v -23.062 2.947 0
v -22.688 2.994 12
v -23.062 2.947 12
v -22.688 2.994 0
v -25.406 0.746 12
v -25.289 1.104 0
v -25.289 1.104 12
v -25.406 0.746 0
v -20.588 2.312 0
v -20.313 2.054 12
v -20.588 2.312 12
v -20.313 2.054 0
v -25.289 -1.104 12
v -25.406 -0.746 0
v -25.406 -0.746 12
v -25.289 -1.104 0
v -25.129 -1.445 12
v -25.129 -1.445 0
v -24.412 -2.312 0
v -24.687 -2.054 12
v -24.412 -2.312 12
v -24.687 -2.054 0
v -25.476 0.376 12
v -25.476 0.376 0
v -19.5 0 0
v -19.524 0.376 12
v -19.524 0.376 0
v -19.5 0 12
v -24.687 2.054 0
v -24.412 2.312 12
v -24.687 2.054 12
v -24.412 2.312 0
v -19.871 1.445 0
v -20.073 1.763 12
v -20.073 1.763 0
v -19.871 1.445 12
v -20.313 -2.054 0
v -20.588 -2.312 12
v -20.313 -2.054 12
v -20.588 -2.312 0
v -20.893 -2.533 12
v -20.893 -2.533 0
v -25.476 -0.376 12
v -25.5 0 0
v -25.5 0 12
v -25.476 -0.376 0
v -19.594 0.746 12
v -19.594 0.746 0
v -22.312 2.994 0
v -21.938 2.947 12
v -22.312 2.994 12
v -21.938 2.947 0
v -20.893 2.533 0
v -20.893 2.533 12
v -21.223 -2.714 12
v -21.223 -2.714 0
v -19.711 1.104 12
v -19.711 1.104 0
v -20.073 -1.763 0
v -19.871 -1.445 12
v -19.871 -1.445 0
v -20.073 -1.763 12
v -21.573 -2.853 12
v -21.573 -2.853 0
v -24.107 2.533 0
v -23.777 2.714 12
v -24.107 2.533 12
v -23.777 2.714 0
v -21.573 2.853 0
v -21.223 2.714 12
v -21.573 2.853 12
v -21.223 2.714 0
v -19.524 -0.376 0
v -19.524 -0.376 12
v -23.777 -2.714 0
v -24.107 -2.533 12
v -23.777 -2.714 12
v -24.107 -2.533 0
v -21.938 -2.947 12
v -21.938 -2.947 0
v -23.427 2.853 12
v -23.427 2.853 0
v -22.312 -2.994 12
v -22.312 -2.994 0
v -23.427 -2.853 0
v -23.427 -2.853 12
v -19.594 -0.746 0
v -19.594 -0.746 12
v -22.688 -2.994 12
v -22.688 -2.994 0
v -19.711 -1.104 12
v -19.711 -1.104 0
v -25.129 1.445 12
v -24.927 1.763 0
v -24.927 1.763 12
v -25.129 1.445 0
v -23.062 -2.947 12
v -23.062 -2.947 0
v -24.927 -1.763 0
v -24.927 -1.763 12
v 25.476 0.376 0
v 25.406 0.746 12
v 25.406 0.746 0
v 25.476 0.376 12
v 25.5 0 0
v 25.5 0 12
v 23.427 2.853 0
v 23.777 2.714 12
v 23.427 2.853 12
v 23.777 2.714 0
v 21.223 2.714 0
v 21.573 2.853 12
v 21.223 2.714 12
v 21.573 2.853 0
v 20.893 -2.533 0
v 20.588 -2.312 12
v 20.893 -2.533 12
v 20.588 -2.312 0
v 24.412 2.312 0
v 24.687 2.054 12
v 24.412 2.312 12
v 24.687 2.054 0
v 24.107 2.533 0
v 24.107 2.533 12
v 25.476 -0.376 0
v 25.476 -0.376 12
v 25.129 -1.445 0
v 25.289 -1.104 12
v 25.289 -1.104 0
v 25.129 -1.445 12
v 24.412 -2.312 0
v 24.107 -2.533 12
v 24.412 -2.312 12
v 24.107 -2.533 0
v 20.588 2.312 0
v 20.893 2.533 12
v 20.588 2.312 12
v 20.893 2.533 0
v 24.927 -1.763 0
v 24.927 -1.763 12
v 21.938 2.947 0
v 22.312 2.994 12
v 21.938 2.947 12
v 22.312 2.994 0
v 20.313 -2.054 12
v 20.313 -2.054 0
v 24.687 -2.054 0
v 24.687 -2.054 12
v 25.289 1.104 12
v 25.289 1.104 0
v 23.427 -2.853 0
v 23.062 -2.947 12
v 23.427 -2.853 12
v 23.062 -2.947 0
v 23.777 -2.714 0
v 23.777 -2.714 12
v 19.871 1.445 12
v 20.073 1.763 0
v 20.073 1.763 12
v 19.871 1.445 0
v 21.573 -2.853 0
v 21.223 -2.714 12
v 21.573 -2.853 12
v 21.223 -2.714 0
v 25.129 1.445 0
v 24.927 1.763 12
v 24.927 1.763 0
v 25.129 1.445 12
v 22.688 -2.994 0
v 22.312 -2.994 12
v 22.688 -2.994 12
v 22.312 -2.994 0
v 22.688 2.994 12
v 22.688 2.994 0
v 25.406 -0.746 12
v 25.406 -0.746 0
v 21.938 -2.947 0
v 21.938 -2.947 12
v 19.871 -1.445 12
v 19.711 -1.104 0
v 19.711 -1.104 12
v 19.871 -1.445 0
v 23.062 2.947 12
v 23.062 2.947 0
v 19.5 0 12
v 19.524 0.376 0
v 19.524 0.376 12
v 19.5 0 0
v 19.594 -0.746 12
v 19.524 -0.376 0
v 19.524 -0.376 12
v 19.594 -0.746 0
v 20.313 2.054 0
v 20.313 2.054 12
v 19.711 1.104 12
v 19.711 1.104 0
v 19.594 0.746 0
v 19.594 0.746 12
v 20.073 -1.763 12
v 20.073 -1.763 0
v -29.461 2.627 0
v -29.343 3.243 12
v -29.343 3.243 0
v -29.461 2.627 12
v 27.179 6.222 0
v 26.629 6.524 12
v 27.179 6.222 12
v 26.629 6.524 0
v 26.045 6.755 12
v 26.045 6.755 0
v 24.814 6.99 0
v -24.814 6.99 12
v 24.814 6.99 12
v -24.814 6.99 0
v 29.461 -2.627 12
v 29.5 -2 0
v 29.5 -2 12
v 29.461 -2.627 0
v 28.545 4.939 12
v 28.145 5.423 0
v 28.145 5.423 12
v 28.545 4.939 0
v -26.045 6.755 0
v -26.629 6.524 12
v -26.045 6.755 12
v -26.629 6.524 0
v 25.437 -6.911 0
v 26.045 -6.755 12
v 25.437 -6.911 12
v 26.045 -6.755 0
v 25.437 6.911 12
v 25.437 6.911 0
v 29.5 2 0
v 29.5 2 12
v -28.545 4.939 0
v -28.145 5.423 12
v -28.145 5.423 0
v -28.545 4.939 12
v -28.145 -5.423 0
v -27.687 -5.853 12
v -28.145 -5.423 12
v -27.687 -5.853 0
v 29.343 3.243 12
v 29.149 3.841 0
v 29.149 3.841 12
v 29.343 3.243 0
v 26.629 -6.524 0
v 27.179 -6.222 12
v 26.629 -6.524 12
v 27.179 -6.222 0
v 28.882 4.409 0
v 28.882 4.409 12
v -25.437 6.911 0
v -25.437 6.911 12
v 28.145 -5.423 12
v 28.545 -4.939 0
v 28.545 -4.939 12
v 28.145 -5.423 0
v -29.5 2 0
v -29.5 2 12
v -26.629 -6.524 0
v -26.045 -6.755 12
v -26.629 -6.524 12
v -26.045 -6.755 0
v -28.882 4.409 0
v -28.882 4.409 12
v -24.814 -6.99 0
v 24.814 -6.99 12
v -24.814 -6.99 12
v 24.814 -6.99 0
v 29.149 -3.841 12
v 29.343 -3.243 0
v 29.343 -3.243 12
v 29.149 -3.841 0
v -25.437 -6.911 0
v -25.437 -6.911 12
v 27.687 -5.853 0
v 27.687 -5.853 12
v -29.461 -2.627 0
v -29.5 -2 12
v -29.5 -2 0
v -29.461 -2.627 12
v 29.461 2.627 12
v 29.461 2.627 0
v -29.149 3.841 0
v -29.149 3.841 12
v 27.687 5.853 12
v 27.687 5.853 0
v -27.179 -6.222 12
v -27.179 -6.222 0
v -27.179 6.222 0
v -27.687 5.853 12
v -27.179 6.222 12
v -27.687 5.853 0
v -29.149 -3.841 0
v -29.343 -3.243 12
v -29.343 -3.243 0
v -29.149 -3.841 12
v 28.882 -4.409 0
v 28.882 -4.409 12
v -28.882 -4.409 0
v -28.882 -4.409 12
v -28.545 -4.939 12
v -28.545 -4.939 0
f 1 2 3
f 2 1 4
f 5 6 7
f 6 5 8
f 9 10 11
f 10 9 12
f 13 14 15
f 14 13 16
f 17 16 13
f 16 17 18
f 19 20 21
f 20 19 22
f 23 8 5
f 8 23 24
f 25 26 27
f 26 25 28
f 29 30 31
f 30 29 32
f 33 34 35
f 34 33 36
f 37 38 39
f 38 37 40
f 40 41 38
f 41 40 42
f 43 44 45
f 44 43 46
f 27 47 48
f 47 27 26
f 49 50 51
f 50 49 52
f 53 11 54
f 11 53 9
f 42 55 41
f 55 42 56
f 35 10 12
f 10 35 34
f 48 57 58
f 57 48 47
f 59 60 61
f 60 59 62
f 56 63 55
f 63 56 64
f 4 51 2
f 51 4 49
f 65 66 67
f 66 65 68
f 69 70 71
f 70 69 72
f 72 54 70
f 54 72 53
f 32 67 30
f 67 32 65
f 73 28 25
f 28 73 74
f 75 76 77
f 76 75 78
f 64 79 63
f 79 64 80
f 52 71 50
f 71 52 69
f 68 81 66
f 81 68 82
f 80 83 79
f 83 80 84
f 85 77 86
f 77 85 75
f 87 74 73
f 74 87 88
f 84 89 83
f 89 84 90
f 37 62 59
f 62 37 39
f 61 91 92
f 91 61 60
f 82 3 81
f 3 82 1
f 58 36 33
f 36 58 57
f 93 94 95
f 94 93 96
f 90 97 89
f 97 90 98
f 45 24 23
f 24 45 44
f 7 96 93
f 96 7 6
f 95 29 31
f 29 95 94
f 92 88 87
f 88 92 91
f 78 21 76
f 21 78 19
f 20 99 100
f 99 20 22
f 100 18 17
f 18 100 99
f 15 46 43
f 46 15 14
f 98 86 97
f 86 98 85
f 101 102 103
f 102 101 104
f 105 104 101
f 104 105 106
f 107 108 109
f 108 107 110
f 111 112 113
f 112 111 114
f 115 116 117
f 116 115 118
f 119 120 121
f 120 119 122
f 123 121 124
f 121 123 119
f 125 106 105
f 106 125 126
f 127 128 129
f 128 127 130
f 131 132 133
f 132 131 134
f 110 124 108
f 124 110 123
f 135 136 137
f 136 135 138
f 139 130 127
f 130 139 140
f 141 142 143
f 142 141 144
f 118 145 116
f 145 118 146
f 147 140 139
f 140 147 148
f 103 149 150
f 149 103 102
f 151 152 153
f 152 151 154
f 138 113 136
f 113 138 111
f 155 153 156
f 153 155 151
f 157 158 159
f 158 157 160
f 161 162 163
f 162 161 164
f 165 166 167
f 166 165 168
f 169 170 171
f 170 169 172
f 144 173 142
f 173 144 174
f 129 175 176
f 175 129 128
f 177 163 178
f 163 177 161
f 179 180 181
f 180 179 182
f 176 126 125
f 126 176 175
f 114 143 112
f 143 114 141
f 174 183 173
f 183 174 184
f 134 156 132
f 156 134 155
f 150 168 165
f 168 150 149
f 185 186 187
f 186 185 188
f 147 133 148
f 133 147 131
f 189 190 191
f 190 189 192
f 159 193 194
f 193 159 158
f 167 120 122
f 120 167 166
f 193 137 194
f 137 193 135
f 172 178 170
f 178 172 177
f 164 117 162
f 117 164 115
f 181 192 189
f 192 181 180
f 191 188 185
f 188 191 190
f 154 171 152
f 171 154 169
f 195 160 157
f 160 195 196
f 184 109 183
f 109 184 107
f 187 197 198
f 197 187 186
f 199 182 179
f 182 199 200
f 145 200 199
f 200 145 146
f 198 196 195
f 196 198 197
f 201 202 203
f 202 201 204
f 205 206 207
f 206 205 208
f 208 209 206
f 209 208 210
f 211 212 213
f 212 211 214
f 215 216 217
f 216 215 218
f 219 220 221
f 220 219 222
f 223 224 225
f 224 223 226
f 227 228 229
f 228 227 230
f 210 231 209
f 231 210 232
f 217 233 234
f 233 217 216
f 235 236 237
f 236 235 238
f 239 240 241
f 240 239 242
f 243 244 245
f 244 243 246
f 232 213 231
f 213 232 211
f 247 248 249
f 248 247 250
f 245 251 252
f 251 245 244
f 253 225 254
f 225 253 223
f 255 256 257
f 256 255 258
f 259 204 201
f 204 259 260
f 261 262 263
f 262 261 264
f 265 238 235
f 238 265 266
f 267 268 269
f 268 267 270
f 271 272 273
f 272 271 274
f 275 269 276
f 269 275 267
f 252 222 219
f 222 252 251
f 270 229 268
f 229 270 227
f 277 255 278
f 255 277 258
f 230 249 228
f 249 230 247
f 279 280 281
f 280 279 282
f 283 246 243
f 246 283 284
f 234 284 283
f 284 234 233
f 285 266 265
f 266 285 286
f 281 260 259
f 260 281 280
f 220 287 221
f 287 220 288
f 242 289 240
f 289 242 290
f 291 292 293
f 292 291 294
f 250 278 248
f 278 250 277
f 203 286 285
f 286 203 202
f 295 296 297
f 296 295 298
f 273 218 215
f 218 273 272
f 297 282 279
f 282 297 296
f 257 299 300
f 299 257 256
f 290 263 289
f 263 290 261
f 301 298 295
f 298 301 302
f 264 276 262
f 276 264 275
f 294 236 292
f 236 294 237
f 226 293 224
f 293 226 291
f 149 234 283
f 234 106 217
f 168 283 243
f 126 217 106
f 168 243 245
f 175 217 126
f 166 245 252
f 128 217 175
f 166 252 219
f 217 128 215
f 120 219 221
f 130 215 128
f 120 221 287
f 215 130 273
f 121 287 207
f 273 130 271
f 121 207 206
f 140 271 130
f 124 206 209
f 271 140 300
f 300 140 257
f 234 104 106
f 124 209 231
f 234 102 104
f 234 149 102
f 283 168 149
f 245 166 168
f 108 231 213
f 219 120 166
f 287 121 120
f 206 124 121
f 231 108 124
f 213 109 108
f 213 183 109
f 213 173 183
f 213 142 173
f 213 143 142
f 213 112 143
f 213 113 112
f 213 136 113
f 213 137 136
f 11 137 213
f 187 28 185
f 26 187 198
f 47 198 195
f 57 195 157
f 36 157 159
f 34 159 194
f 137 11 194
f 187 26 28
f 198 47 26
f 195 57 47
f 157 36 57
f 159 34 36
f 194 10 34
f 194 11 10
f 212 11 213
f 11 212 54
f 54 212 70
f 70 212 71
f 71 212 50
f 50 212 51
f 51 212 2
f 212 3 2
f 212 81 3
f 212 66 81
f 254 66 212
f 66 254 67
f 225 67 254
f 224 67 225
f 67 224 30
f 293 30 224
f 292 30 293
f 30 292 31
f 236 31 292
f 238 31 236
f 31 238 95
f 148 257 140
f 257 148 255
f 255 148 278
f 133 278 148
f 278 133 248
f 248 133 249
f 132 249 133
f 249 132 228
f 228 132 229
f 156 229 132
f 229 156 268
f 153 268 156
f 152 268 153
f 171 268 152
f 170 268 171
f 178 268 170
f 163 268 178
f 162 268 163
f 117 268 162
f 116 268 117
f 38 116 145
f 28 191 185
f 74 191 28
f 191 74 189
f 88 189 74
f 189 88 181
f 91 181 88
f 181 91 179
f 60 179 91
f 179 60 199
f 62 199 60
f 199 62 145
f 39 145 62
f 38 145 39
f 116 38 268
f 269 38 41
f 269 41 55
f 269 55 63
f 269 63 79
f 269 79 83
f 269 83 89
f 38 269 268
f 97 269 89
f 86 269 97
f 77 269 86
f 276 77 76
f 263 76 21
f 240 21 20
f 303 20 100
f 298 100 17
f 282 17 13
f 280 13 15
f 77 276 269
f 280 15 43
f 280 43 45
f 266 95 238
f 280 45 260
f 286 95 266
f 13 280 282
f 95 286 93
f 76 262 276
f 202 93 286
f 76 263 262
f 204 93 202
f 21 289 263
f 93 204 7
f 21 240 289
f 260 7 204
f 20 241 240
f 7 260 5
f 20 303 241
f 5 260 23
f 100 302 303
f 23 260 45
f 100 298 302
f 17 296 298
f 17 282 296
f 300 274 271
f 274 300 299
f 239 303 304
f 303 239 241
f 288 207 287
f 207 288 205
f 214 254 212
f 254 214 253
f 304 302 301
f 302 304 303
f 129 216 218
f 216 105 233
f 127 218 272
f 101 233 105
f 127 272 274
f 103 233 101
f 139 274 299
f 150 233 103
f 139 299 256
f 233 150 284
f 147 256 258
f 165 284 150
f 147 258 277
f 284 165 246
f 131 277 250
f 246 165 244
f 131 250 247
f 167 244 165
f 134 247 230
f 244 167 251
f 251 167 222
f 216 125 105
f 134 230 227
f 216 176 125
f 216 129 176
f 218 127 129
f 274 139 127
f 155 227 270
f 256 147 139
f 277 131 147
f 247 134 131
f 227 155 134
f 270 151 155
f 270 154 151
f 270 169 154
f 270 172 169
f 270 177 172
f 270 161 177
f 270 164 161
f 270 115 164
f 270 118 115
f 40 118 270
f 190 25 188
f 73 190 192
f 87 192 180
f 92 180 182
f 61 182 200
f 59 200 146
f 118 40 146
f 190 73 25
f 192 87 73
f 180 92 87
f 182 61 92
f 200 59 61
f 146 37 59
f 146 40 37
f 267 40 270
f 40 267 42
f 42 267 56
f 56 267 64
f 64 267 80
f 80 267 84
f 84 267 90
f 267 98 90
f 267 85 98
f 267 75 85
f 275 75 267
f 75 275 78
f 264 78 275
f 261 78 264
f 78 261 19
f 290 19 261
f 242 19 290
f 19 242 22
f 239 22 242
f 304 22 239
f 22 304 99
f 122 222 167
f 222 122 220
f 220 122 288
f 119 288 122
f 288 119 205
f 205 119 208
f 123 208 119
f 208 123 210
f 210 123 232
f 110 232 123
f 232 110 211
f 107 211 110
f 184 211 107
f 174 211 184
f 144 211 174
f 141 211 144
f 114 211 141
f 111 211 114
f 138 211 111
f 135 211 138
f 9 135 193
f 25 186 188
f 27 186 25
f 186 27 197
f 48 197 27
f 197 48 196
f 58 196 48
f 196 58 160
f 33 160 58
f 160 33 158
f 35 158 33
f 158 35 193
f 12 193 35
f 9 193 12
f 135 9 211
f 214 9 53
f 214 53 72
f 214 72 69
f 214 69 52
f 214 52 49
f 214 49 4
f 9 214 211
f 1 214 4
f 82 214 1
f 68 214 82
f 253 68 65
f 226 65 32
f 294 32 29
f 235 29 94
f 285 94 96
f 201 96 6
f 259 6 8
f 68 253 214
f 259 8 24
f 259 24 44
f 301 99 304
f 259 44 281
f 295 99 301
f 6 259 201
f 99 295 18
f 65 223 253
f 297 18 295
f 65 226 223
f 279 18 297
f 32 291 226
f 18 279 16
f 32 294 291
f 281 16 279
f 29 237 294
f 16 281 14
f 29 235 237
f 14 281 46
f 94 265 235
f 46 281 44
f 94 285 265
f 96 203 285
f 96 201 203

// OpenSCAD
$fn = 50;


difference() {
	union() {
		hull() {
			translate(v = [-24.5000000000, 2.0000000000, 0]) {
				cylinder(h = 12, r = 5);
			}
			translate(v = [24.5000000000, 2.0000000000, 0]) {
				cylinder(h = 12, r = 5);
			}
			translate(v = [-24.5000000000, -2.0000000000, 0]) {
				cylinder(h = 12, r = 5);
			}
			translate(v = [24.5000000000, -2.0000000000, 0]) {
				cylinder(h = 12, r = 5);
			}
		}
	}
	union() {
		translate(v = [-22.5000000000, 0.0000000000, -100.0000000000]) {
			cylinder(h = 200, r = 3.0000000000);
		}
		translate(v = [-22.5000000000, 0.0000000000, -100.0000000000]) {
			cylinder(h = 200, r = 3.0000000000);
		}
		translate(v = [22.5000000000, 0.0000000000, -100.0000000000]) {
			cylinder(h = 200, r = 3.0000000000);
		}
		translate(v = [22.5000000000, 0.0000000000, -100.0000000000]) {
			cylinder(h = 200, r = 3.0000000000);
		}
	}
}
